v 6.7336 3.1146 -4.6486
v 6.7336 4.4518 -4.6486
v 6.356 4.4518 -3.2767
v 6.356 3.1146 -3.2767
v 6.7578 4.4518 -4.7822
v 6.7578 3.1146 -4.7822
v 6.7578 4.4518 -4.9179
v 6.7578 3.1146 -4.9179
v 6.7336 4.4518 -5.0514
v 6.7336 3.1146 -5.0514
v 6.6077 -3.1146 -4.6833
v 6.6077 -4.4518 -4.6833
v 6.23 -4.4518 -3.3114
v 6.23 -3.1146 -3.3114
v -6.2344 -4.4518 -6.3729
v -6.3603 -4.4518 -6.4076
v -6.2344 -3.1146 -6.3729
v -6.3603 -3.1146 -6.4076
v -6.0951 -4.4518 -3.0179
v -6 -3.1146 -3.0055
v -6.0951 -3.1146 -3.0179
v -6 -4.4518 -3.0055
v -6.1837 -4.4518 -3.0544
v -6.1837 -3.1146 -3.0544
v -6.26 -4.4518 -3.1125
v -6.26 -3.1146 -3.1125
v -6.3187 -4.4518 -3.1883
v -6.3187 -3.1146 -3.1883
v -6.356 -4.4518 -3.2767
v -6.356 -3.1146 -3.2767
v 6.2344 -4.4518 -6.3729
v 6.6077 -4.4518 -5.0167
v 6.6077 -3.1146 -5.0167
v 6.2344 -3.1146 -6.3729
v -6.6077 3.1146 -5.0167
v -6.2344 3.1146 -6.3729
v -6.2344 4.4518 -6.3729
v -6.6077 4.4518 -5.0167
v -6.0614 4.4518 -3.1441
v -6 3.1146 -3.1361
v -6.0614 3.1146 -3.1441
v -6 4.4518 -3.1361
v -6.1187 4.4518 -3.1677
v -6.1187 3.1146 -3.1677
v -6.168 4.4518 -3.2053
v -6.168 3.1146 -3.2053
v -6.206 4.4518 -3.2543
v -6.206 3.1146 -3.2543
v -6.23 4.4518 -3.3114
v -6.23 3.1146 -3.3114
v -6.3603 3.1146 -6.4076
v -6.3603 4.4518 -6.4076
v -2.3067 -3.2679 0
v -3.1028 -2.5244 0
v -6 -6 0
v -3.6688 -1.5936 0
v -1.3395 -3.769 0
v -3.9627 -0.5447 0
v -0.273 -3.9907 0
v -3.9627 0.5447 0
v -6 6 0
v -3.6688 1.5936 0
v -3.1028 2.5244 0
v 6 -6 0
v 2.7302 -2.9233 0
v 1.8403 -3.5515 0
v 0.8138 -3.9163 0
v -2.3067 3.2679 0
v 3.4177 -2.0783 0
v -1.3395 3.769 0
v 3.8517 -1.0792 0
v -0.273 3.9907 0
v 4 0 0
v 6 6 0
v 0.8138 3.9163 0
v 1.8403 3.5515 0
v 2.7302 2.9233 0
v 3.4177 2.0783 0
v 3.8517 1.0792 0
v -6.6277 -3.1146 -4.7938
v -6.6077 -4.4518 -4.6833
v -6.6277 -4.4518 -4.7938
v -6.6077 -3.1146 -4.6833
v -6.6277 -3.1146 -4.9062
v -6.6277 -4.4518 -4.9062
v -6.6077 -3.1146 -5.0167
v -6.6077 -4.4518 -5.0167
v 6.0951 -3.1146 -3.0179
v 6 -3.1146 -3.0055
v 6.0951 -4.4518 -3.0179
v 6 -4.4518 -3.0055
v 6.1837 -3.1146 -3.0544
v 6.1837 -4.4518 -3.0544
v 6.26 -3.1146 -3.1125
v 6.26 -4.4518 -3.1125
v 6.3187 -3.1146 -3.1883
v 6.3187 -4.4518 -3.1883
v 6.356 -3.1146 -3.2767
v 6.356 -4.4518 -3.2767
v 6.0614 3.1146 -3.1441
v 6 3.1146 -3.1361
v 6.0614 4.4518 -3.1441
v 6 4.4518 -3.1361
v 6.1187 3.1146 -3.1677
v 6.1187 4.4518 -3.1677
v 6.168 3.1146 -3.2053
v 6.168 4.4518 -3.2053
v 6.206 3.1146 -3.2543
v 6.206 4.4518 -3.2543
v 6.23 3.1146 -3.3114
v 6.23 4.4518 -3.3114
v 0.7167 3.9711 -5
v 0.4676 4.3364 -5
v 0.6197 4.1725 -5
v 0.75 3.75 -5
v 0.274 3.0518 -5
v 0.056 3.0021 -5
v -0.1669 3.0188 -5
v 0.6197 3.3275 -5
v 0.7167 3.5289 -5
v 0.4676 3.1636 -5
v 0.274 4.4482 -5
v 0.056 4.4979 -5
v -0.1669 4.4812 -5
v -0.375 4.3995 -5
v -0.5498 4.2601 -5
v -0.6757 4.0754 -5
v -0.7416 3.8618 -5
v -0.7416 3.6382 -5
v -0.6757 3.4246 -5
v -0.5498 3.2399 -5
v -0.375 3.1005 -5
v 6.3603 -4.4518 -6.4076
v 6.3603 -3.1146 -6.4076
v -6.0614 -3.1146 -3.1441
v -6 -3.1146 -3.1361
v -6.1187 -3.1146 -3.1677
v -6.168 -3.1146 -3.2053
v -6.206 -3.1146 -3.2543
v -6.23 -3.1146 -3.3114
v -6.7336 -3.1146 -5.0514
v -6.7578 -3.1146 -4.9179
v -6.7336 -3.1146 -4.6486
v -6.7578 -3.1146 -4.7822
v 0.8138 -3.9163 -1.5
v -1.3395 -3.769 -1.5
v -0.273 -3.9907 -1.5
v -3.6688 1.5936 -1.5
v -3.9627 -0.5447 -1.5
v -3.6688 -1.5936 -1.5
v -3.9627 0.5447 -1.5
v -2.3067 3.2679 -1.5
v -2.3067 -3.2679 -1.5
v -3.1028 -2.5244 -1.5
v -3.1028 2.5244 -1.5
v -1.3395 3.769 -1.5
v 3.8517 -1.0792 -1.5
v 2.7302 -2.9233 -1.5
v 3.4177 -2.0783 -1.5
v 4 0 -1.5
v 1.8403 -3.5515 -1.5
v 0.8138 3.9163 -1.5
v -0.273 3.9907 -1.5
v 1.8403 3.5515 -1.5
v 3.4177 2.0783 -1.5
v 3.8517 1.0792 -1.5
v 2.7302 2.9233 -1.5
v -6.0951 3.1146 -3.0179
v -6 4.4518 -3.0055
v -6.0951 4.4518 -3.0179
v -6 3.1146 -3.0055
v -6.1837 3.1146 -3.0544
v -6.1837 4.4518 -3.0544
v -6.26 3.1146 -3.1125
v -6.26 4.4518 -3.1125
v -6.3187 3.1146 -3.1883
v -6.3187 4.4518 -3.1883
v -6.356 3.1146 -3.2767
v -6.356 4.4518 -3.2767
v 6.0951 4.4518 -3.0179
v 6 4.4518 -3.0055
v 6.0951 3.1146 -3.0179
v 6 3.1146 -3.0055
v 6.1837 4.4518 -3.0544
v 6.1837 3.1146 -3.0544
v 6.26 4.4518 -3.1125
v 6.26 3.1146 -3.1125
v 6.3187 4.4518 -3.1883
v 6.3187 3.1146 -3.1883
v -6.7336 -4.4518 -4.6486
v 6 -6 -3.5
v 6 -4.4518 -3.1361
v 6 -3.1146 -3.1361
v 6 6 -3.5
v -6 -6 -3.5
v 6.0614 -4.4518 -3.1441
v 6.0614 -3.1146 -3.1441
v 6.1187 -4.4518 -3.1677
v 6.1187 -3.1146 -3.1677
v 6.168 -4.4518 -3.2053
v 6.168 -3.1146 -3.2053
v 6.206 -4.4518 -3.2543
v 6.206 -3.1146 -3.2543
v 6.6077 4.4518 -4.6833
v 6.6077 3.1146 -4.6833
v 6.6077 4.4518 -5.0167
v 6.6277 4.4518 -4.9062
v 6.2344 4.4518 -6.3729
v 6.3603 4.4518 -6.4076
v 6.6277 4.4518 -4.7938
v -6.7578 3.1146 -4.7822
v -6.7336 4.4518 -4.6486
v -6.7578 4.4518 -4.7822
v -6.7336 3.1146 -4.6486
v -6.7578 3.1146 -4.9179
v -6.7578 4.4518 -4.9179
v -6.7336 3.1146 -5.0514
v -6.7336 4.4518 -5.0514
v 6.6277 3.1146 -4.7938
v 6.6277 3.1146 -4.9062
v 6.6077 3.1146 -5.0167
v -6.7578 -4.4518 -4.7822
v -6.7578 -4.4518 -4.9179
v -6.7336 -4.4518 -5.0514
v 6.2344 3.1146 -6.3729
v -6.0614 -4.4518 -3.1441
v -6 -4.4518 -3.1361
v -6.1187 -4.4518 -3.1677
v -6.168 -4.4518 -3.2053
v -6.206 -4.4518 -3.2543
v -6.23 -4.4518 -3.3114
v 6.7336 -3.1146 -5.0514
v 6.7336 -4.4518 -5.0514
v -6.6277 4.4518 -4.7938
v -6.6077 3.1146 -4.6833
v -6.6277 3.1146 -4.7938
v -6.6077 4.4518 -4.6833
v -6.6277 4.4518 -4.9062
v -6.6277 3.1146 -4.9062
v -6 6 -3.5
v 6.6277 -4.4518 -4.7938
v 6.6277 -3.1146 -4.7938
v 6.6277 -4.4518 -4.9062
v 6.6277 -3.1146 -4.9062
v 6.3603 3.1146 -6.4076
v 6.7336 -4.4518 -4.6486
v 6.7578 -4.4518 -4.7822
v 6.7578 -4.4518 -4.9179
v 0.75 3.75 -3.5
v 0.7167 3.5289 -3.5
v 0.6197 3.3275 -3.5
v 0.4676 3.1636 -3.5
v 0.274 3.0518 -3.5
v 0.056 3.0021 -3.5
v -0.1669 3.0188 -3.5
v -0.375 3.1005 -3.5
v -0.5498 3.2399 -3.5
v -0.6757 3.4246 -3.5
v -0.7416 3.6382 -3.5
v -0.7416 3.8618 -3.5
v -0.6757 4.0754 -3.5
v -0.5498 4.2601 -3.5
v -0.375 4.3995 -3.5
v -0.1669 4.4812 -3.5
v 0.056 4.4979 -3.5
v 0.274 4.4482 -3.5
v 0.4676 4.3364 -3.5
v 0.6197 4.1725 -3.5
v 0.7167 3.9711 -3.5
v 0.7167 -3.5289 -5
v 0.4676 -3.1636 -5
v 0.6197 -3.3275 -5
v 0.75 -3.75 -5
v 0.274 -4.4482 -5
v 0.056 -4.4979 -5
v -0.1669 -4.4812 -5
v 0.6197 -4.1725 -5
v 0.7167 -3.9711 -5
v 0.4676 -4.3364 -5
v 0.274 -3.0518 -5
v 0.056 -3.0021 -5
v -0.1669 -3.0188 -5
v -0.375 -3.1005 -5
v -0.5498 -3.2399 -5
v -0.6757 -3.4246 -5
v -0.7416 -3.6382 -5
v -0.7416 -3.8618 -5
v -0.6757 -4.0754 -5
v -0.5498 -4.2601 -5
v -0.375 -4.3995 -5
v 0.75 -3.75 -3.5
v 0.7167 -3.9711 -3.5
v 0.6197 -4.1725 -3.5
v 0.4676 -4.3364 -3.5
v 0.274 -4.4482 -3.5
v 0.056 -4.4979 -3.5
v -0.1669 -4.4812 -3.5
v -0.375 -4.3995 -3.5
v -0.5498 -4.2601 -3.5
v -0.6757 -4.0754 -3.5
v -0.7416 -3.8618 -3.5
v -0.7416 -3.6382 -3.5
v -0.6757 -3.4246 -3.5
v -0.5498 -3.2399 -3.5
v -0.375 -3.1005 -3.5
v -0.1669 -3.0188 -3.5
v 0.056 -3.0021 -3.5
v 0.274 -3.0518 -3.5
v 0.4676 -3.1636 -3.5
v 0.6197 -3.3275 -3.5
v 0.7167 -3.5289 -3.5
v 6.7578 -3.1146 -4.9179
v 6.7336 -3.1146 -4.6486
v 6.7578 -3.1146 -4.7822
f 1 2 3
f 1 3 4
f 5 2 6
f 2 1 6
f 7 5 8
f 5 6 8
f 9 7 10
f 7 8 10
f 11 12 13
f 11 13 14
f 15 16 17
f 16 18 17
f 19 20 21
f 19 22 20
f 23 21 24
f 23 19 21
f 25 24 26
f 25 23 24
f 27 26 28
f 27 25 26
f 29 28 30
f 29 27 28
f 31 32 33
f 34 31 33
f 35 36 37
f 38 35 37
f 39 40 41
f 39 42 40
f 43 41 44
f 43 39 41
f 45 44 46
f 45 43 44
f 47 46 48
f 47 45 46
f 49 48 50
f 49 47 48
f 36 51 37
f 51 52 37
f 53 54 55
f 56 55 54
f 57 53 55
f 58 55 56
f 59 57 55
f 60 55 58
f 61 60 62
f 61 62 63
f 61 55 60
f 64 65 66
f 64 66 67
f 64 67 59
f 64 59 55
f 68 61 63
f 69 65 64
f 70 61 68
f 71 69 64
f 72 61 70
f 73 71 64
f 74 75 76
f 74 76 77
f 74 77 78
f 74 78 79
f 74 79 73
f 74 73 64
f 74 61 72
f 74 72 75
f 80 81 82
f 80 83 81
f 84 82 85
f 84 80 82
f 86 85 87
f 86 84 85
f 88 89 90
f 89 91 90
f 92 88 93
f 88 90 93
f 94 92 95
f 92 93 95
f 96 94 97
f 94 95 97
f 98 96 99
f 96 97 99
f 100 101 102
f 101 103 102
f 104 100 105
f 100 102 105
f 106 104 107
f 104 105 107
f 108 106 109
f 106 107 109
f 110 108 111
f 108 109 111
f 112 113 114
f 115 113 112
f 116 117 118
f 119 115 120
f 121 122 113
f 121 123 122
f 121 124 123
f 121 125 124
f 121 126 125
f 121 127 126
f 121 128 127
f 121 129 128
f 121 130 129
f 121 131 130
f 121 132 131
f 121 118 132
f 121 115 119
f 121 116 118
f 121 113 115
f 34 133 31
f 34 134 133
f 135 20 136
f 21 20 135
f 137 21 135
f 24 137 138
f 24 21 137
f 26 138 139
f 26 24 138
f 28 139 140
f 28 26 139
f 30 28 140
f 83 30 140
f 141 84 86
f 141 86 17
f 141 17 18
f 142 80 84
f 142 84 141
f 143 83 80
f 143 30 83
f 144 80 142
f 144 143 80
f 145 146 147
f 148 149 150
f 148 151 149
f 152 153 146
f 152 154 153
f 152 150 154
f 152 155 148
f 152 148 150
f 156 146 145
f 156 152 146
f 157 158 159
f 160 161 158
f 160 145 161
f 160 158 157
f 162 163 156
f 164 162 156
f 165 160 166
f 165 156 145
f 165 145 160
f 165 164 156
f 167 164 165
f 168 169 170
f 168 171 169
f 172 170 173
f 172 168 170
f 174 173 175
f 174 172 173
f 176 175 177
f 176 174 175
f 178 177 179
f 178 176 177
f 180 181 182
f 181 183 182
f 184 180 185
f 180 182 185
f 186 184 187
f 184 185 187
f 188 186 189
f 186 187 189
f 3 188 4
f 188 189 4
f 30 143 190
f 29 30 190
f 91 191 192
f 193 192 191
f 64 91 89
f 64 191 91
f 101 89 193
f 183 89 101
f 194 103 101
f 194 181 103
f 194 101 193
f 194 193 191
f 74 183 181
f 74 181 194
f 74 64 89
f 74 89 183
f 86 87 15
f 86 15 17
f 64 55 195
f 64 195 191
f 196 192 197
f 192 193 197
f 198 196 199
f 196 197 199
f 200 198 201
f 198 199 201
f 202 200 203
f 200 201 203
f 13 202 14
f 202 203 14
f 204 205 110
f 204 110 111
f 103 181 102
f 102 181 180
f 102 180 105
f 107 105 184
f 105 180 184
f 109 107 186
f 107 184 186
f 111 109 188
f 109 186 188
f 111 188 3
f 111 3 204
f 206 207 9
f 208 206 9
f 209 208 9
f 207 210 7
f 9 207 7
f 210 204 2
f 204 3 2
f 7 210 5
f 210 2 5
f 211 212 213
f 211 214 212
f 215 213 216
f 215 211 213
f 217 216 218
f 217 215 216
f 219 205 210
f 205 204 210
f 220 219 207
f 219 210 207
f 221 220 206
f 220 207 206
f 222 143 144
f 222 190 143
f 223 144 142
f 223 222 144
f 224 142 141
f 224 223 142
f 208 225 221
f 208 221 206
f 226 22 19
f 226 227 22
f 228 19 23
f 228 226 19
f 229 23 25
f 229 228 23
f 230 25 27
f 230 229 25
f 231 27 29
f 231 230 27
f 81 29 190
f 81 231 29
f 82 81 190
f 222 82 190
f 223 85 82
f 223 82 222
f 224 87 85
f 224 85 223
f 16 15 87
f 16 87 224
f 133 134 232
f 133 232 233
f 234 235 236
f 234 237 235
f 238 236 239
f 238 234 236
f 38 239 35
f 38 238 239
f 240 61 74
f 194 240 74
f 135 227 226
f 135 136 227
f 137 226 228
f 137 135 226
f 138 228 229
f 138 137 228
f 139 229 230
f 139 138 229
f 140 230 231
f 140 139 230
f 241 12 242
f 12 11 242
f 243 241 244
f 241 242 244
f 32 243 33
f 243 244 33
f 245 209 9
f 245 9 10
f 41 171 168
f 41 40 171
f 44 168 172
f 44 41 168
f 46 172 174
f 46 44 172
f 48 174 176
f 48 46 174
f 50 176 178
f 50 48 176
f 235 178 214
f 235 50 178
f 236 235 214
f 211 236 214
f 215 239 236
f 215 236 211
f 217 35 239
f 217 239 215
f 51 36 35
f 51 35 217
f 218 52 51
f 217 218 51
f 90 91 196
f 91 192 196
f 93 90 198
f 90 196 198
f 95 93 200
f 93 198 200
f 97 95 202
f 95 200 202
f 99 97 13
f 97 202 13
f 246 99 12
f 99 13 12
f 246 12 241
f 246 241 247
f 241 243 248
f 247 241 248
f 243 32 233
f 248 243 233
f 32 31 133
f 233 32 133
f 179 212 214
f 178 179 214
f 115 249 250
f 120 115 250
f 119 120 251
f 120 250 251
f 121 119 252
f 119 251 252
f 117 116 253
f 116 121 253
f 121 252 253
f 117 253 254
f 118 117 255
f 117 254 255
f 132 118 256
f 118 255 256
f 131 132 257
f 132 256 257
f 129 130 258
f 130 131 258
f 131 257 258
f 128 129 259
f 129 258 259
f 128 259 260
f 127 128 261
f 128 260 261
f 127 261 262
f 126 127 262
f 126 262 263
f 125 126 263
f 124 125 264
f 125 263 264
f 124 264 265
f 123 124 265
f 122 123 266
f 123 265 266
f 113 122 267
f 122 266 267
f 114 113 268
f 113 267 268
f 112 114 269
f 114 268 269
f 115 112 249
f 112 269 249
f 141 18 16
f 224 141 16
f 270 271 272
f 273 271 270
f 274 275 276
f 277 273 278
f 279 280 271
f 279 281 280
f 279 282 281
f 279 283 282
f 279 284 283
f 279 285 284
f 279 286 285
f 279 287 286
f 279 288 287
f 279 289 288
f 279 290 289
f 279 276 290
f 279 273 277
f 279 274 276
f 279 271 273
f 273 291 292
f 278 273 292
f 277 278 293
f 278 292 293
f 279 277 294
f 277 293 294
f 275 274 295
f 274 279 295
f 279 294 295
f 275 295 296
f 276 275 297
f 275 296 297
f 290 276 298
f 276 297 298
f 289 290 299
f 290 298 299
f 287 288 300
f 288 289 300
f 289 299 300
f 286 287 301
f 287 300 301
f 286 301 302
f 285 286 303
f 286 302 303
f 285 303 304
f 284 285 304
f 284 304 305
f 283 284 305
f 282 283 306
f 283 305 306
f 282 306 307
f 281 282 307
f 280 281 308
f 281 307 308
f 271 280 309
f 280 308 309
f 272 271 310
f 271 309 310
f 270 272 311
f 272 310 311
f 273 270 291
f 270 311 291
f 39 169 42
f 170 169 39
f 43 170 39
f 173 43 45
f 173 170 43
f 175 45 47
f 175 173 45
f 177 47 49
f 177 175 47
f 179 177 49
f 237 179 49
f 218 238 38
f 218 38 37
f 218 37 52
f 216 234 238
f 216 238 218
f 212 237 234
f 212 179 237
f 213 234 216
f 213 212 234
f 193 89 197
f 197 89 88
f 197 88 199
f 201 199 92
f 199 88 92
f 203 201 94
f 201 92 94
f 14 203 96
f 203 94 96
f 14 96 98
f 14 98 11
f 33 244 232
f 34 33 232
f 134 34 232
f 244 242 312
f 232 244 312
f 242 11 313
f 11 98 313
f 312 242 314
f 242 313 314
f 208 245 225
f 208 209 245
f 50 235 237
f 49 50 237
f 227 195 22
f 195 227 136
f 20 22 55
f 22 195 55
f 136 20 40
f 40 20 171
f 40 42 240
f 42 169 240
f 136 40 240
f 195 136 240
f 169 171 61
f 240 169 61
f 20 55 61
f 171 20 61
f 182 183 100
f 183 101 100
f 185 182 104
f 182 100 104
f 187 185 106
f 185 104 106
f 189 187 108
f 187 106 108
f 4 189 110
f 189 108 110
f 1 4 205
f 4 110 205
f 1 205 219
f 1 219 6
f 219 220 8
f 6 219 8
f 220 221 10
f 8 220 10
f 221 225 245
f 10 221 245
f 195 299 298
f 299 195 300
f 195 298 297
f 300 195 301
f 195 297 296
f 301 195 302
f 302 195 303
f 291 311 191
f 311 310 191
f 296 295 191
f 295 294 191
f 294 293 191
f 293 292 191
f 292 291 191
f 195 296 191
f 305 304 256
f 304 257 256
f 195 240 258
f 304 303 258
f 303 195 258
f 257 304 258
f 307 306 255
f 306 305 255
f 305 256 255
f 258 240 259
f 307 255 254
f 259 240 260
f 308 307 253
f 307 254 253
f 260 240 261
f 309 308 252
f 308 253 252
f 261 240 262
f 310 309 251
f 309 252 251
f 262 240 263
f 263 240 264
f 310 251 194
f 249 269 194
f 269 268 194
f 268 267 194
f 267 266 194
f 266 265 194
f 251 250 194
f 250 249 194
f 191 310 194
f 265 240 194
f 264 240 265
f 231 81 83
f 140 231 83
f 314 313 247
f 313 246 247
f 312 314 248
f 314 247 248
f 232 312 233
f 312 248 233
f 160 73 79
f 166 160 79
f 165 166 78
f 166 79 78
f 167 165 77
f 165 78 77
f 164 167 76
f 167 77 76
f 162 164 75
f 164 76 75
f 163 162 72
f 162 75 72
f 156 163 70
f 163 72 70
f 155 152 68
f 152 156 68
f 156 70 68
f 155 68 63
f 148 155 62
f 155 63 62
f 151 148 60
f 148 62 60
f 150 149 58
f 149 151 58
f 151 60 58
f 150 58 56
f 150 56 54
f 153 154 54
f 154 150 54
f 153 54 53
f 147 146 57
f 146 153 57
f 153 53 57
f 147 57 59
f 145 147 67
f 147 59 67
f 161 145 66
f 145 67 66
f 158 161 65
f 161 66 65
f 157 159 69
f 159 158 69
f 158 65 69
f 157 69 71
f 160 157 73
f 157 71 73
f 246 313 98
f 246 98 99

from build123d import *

# Parameters (mm, degrees)
F0_W     = 12
F0_H     = 12
F1_DEPTH = 3.5
F2_R     = 4
F3_DEPTH = 1.5
F4_R     = 0.75
F5_DEPTH = 1.5
F6_W     = 1.3371782843
F6_H     = 0.1306298655


with BuildPart() as f1:
    # F0 (on Top) → F1 (new body)
    with BuildSketch(Plane.XY):
        Rectangle(F0_W, F0_H)
    extrude(amount=-F1_DEPTH)

    # F2 (on Top) → F3 (cut)
    with BuildSketch(Plane.XY):
        Circle(F2_R)
    extrude(amount=-F3_DEPTH, mode=Mode.SUBTRACT)

    # F4 (on face) → F5 (join)
    with BuildSketch(Plane(origin=(0, 0, -3.5), x_dir=(1, 0, 0), z_dir=(0, 0, -1))):
        with Locations((0, -3.75)):
            Circle(F4_R)
        with Locations((0, 3.75)):
            Circle(F4_R)
    extrude(amount=F5_DEPTH)

    # F8: sweep along a path in F7
    with BuildLine(Plane(origin=(0, 6, 0), x_dir=(-1, 0, 0), z_dir=(0, 1, 0))) as f8_path:
        ThreePointArc((-6, -2.9808722661), (-6.2386599526, -3.0614322815), (-6.3796732575, -3.2701515593))
        Line((-6.3796732575, -3.2701515593), (-6.7573431879, -4.6420912258))
        ThreePointArc((-6.7573431879, -4.6420912258), (-6.7854382425, -4.8500061966), (-6.7573431879, -5.0579211675))
        Line((-6.7573431879, -5.0579211675), (-6.3840173786, -6.4140801969))
    # F6 (on face) → F8 (sweep)
    with BuildSketch(Plane.YZ.offset(6)):
        with Locations((-3.7832342787, -3.070783685)):
            Rectangle(F6_W, F6_H)
        with Locations((3.7832342787, -3.070783685)):
            Rectangle(F6_W, F6_H)
    sweep(path=f8_path.line)

    # F9: F1 across plane


with BuildPart() as f1_1:
    add(f1.part)
    add(f1.part.mirror(Plane.YZ))


solid = f1_1.part
